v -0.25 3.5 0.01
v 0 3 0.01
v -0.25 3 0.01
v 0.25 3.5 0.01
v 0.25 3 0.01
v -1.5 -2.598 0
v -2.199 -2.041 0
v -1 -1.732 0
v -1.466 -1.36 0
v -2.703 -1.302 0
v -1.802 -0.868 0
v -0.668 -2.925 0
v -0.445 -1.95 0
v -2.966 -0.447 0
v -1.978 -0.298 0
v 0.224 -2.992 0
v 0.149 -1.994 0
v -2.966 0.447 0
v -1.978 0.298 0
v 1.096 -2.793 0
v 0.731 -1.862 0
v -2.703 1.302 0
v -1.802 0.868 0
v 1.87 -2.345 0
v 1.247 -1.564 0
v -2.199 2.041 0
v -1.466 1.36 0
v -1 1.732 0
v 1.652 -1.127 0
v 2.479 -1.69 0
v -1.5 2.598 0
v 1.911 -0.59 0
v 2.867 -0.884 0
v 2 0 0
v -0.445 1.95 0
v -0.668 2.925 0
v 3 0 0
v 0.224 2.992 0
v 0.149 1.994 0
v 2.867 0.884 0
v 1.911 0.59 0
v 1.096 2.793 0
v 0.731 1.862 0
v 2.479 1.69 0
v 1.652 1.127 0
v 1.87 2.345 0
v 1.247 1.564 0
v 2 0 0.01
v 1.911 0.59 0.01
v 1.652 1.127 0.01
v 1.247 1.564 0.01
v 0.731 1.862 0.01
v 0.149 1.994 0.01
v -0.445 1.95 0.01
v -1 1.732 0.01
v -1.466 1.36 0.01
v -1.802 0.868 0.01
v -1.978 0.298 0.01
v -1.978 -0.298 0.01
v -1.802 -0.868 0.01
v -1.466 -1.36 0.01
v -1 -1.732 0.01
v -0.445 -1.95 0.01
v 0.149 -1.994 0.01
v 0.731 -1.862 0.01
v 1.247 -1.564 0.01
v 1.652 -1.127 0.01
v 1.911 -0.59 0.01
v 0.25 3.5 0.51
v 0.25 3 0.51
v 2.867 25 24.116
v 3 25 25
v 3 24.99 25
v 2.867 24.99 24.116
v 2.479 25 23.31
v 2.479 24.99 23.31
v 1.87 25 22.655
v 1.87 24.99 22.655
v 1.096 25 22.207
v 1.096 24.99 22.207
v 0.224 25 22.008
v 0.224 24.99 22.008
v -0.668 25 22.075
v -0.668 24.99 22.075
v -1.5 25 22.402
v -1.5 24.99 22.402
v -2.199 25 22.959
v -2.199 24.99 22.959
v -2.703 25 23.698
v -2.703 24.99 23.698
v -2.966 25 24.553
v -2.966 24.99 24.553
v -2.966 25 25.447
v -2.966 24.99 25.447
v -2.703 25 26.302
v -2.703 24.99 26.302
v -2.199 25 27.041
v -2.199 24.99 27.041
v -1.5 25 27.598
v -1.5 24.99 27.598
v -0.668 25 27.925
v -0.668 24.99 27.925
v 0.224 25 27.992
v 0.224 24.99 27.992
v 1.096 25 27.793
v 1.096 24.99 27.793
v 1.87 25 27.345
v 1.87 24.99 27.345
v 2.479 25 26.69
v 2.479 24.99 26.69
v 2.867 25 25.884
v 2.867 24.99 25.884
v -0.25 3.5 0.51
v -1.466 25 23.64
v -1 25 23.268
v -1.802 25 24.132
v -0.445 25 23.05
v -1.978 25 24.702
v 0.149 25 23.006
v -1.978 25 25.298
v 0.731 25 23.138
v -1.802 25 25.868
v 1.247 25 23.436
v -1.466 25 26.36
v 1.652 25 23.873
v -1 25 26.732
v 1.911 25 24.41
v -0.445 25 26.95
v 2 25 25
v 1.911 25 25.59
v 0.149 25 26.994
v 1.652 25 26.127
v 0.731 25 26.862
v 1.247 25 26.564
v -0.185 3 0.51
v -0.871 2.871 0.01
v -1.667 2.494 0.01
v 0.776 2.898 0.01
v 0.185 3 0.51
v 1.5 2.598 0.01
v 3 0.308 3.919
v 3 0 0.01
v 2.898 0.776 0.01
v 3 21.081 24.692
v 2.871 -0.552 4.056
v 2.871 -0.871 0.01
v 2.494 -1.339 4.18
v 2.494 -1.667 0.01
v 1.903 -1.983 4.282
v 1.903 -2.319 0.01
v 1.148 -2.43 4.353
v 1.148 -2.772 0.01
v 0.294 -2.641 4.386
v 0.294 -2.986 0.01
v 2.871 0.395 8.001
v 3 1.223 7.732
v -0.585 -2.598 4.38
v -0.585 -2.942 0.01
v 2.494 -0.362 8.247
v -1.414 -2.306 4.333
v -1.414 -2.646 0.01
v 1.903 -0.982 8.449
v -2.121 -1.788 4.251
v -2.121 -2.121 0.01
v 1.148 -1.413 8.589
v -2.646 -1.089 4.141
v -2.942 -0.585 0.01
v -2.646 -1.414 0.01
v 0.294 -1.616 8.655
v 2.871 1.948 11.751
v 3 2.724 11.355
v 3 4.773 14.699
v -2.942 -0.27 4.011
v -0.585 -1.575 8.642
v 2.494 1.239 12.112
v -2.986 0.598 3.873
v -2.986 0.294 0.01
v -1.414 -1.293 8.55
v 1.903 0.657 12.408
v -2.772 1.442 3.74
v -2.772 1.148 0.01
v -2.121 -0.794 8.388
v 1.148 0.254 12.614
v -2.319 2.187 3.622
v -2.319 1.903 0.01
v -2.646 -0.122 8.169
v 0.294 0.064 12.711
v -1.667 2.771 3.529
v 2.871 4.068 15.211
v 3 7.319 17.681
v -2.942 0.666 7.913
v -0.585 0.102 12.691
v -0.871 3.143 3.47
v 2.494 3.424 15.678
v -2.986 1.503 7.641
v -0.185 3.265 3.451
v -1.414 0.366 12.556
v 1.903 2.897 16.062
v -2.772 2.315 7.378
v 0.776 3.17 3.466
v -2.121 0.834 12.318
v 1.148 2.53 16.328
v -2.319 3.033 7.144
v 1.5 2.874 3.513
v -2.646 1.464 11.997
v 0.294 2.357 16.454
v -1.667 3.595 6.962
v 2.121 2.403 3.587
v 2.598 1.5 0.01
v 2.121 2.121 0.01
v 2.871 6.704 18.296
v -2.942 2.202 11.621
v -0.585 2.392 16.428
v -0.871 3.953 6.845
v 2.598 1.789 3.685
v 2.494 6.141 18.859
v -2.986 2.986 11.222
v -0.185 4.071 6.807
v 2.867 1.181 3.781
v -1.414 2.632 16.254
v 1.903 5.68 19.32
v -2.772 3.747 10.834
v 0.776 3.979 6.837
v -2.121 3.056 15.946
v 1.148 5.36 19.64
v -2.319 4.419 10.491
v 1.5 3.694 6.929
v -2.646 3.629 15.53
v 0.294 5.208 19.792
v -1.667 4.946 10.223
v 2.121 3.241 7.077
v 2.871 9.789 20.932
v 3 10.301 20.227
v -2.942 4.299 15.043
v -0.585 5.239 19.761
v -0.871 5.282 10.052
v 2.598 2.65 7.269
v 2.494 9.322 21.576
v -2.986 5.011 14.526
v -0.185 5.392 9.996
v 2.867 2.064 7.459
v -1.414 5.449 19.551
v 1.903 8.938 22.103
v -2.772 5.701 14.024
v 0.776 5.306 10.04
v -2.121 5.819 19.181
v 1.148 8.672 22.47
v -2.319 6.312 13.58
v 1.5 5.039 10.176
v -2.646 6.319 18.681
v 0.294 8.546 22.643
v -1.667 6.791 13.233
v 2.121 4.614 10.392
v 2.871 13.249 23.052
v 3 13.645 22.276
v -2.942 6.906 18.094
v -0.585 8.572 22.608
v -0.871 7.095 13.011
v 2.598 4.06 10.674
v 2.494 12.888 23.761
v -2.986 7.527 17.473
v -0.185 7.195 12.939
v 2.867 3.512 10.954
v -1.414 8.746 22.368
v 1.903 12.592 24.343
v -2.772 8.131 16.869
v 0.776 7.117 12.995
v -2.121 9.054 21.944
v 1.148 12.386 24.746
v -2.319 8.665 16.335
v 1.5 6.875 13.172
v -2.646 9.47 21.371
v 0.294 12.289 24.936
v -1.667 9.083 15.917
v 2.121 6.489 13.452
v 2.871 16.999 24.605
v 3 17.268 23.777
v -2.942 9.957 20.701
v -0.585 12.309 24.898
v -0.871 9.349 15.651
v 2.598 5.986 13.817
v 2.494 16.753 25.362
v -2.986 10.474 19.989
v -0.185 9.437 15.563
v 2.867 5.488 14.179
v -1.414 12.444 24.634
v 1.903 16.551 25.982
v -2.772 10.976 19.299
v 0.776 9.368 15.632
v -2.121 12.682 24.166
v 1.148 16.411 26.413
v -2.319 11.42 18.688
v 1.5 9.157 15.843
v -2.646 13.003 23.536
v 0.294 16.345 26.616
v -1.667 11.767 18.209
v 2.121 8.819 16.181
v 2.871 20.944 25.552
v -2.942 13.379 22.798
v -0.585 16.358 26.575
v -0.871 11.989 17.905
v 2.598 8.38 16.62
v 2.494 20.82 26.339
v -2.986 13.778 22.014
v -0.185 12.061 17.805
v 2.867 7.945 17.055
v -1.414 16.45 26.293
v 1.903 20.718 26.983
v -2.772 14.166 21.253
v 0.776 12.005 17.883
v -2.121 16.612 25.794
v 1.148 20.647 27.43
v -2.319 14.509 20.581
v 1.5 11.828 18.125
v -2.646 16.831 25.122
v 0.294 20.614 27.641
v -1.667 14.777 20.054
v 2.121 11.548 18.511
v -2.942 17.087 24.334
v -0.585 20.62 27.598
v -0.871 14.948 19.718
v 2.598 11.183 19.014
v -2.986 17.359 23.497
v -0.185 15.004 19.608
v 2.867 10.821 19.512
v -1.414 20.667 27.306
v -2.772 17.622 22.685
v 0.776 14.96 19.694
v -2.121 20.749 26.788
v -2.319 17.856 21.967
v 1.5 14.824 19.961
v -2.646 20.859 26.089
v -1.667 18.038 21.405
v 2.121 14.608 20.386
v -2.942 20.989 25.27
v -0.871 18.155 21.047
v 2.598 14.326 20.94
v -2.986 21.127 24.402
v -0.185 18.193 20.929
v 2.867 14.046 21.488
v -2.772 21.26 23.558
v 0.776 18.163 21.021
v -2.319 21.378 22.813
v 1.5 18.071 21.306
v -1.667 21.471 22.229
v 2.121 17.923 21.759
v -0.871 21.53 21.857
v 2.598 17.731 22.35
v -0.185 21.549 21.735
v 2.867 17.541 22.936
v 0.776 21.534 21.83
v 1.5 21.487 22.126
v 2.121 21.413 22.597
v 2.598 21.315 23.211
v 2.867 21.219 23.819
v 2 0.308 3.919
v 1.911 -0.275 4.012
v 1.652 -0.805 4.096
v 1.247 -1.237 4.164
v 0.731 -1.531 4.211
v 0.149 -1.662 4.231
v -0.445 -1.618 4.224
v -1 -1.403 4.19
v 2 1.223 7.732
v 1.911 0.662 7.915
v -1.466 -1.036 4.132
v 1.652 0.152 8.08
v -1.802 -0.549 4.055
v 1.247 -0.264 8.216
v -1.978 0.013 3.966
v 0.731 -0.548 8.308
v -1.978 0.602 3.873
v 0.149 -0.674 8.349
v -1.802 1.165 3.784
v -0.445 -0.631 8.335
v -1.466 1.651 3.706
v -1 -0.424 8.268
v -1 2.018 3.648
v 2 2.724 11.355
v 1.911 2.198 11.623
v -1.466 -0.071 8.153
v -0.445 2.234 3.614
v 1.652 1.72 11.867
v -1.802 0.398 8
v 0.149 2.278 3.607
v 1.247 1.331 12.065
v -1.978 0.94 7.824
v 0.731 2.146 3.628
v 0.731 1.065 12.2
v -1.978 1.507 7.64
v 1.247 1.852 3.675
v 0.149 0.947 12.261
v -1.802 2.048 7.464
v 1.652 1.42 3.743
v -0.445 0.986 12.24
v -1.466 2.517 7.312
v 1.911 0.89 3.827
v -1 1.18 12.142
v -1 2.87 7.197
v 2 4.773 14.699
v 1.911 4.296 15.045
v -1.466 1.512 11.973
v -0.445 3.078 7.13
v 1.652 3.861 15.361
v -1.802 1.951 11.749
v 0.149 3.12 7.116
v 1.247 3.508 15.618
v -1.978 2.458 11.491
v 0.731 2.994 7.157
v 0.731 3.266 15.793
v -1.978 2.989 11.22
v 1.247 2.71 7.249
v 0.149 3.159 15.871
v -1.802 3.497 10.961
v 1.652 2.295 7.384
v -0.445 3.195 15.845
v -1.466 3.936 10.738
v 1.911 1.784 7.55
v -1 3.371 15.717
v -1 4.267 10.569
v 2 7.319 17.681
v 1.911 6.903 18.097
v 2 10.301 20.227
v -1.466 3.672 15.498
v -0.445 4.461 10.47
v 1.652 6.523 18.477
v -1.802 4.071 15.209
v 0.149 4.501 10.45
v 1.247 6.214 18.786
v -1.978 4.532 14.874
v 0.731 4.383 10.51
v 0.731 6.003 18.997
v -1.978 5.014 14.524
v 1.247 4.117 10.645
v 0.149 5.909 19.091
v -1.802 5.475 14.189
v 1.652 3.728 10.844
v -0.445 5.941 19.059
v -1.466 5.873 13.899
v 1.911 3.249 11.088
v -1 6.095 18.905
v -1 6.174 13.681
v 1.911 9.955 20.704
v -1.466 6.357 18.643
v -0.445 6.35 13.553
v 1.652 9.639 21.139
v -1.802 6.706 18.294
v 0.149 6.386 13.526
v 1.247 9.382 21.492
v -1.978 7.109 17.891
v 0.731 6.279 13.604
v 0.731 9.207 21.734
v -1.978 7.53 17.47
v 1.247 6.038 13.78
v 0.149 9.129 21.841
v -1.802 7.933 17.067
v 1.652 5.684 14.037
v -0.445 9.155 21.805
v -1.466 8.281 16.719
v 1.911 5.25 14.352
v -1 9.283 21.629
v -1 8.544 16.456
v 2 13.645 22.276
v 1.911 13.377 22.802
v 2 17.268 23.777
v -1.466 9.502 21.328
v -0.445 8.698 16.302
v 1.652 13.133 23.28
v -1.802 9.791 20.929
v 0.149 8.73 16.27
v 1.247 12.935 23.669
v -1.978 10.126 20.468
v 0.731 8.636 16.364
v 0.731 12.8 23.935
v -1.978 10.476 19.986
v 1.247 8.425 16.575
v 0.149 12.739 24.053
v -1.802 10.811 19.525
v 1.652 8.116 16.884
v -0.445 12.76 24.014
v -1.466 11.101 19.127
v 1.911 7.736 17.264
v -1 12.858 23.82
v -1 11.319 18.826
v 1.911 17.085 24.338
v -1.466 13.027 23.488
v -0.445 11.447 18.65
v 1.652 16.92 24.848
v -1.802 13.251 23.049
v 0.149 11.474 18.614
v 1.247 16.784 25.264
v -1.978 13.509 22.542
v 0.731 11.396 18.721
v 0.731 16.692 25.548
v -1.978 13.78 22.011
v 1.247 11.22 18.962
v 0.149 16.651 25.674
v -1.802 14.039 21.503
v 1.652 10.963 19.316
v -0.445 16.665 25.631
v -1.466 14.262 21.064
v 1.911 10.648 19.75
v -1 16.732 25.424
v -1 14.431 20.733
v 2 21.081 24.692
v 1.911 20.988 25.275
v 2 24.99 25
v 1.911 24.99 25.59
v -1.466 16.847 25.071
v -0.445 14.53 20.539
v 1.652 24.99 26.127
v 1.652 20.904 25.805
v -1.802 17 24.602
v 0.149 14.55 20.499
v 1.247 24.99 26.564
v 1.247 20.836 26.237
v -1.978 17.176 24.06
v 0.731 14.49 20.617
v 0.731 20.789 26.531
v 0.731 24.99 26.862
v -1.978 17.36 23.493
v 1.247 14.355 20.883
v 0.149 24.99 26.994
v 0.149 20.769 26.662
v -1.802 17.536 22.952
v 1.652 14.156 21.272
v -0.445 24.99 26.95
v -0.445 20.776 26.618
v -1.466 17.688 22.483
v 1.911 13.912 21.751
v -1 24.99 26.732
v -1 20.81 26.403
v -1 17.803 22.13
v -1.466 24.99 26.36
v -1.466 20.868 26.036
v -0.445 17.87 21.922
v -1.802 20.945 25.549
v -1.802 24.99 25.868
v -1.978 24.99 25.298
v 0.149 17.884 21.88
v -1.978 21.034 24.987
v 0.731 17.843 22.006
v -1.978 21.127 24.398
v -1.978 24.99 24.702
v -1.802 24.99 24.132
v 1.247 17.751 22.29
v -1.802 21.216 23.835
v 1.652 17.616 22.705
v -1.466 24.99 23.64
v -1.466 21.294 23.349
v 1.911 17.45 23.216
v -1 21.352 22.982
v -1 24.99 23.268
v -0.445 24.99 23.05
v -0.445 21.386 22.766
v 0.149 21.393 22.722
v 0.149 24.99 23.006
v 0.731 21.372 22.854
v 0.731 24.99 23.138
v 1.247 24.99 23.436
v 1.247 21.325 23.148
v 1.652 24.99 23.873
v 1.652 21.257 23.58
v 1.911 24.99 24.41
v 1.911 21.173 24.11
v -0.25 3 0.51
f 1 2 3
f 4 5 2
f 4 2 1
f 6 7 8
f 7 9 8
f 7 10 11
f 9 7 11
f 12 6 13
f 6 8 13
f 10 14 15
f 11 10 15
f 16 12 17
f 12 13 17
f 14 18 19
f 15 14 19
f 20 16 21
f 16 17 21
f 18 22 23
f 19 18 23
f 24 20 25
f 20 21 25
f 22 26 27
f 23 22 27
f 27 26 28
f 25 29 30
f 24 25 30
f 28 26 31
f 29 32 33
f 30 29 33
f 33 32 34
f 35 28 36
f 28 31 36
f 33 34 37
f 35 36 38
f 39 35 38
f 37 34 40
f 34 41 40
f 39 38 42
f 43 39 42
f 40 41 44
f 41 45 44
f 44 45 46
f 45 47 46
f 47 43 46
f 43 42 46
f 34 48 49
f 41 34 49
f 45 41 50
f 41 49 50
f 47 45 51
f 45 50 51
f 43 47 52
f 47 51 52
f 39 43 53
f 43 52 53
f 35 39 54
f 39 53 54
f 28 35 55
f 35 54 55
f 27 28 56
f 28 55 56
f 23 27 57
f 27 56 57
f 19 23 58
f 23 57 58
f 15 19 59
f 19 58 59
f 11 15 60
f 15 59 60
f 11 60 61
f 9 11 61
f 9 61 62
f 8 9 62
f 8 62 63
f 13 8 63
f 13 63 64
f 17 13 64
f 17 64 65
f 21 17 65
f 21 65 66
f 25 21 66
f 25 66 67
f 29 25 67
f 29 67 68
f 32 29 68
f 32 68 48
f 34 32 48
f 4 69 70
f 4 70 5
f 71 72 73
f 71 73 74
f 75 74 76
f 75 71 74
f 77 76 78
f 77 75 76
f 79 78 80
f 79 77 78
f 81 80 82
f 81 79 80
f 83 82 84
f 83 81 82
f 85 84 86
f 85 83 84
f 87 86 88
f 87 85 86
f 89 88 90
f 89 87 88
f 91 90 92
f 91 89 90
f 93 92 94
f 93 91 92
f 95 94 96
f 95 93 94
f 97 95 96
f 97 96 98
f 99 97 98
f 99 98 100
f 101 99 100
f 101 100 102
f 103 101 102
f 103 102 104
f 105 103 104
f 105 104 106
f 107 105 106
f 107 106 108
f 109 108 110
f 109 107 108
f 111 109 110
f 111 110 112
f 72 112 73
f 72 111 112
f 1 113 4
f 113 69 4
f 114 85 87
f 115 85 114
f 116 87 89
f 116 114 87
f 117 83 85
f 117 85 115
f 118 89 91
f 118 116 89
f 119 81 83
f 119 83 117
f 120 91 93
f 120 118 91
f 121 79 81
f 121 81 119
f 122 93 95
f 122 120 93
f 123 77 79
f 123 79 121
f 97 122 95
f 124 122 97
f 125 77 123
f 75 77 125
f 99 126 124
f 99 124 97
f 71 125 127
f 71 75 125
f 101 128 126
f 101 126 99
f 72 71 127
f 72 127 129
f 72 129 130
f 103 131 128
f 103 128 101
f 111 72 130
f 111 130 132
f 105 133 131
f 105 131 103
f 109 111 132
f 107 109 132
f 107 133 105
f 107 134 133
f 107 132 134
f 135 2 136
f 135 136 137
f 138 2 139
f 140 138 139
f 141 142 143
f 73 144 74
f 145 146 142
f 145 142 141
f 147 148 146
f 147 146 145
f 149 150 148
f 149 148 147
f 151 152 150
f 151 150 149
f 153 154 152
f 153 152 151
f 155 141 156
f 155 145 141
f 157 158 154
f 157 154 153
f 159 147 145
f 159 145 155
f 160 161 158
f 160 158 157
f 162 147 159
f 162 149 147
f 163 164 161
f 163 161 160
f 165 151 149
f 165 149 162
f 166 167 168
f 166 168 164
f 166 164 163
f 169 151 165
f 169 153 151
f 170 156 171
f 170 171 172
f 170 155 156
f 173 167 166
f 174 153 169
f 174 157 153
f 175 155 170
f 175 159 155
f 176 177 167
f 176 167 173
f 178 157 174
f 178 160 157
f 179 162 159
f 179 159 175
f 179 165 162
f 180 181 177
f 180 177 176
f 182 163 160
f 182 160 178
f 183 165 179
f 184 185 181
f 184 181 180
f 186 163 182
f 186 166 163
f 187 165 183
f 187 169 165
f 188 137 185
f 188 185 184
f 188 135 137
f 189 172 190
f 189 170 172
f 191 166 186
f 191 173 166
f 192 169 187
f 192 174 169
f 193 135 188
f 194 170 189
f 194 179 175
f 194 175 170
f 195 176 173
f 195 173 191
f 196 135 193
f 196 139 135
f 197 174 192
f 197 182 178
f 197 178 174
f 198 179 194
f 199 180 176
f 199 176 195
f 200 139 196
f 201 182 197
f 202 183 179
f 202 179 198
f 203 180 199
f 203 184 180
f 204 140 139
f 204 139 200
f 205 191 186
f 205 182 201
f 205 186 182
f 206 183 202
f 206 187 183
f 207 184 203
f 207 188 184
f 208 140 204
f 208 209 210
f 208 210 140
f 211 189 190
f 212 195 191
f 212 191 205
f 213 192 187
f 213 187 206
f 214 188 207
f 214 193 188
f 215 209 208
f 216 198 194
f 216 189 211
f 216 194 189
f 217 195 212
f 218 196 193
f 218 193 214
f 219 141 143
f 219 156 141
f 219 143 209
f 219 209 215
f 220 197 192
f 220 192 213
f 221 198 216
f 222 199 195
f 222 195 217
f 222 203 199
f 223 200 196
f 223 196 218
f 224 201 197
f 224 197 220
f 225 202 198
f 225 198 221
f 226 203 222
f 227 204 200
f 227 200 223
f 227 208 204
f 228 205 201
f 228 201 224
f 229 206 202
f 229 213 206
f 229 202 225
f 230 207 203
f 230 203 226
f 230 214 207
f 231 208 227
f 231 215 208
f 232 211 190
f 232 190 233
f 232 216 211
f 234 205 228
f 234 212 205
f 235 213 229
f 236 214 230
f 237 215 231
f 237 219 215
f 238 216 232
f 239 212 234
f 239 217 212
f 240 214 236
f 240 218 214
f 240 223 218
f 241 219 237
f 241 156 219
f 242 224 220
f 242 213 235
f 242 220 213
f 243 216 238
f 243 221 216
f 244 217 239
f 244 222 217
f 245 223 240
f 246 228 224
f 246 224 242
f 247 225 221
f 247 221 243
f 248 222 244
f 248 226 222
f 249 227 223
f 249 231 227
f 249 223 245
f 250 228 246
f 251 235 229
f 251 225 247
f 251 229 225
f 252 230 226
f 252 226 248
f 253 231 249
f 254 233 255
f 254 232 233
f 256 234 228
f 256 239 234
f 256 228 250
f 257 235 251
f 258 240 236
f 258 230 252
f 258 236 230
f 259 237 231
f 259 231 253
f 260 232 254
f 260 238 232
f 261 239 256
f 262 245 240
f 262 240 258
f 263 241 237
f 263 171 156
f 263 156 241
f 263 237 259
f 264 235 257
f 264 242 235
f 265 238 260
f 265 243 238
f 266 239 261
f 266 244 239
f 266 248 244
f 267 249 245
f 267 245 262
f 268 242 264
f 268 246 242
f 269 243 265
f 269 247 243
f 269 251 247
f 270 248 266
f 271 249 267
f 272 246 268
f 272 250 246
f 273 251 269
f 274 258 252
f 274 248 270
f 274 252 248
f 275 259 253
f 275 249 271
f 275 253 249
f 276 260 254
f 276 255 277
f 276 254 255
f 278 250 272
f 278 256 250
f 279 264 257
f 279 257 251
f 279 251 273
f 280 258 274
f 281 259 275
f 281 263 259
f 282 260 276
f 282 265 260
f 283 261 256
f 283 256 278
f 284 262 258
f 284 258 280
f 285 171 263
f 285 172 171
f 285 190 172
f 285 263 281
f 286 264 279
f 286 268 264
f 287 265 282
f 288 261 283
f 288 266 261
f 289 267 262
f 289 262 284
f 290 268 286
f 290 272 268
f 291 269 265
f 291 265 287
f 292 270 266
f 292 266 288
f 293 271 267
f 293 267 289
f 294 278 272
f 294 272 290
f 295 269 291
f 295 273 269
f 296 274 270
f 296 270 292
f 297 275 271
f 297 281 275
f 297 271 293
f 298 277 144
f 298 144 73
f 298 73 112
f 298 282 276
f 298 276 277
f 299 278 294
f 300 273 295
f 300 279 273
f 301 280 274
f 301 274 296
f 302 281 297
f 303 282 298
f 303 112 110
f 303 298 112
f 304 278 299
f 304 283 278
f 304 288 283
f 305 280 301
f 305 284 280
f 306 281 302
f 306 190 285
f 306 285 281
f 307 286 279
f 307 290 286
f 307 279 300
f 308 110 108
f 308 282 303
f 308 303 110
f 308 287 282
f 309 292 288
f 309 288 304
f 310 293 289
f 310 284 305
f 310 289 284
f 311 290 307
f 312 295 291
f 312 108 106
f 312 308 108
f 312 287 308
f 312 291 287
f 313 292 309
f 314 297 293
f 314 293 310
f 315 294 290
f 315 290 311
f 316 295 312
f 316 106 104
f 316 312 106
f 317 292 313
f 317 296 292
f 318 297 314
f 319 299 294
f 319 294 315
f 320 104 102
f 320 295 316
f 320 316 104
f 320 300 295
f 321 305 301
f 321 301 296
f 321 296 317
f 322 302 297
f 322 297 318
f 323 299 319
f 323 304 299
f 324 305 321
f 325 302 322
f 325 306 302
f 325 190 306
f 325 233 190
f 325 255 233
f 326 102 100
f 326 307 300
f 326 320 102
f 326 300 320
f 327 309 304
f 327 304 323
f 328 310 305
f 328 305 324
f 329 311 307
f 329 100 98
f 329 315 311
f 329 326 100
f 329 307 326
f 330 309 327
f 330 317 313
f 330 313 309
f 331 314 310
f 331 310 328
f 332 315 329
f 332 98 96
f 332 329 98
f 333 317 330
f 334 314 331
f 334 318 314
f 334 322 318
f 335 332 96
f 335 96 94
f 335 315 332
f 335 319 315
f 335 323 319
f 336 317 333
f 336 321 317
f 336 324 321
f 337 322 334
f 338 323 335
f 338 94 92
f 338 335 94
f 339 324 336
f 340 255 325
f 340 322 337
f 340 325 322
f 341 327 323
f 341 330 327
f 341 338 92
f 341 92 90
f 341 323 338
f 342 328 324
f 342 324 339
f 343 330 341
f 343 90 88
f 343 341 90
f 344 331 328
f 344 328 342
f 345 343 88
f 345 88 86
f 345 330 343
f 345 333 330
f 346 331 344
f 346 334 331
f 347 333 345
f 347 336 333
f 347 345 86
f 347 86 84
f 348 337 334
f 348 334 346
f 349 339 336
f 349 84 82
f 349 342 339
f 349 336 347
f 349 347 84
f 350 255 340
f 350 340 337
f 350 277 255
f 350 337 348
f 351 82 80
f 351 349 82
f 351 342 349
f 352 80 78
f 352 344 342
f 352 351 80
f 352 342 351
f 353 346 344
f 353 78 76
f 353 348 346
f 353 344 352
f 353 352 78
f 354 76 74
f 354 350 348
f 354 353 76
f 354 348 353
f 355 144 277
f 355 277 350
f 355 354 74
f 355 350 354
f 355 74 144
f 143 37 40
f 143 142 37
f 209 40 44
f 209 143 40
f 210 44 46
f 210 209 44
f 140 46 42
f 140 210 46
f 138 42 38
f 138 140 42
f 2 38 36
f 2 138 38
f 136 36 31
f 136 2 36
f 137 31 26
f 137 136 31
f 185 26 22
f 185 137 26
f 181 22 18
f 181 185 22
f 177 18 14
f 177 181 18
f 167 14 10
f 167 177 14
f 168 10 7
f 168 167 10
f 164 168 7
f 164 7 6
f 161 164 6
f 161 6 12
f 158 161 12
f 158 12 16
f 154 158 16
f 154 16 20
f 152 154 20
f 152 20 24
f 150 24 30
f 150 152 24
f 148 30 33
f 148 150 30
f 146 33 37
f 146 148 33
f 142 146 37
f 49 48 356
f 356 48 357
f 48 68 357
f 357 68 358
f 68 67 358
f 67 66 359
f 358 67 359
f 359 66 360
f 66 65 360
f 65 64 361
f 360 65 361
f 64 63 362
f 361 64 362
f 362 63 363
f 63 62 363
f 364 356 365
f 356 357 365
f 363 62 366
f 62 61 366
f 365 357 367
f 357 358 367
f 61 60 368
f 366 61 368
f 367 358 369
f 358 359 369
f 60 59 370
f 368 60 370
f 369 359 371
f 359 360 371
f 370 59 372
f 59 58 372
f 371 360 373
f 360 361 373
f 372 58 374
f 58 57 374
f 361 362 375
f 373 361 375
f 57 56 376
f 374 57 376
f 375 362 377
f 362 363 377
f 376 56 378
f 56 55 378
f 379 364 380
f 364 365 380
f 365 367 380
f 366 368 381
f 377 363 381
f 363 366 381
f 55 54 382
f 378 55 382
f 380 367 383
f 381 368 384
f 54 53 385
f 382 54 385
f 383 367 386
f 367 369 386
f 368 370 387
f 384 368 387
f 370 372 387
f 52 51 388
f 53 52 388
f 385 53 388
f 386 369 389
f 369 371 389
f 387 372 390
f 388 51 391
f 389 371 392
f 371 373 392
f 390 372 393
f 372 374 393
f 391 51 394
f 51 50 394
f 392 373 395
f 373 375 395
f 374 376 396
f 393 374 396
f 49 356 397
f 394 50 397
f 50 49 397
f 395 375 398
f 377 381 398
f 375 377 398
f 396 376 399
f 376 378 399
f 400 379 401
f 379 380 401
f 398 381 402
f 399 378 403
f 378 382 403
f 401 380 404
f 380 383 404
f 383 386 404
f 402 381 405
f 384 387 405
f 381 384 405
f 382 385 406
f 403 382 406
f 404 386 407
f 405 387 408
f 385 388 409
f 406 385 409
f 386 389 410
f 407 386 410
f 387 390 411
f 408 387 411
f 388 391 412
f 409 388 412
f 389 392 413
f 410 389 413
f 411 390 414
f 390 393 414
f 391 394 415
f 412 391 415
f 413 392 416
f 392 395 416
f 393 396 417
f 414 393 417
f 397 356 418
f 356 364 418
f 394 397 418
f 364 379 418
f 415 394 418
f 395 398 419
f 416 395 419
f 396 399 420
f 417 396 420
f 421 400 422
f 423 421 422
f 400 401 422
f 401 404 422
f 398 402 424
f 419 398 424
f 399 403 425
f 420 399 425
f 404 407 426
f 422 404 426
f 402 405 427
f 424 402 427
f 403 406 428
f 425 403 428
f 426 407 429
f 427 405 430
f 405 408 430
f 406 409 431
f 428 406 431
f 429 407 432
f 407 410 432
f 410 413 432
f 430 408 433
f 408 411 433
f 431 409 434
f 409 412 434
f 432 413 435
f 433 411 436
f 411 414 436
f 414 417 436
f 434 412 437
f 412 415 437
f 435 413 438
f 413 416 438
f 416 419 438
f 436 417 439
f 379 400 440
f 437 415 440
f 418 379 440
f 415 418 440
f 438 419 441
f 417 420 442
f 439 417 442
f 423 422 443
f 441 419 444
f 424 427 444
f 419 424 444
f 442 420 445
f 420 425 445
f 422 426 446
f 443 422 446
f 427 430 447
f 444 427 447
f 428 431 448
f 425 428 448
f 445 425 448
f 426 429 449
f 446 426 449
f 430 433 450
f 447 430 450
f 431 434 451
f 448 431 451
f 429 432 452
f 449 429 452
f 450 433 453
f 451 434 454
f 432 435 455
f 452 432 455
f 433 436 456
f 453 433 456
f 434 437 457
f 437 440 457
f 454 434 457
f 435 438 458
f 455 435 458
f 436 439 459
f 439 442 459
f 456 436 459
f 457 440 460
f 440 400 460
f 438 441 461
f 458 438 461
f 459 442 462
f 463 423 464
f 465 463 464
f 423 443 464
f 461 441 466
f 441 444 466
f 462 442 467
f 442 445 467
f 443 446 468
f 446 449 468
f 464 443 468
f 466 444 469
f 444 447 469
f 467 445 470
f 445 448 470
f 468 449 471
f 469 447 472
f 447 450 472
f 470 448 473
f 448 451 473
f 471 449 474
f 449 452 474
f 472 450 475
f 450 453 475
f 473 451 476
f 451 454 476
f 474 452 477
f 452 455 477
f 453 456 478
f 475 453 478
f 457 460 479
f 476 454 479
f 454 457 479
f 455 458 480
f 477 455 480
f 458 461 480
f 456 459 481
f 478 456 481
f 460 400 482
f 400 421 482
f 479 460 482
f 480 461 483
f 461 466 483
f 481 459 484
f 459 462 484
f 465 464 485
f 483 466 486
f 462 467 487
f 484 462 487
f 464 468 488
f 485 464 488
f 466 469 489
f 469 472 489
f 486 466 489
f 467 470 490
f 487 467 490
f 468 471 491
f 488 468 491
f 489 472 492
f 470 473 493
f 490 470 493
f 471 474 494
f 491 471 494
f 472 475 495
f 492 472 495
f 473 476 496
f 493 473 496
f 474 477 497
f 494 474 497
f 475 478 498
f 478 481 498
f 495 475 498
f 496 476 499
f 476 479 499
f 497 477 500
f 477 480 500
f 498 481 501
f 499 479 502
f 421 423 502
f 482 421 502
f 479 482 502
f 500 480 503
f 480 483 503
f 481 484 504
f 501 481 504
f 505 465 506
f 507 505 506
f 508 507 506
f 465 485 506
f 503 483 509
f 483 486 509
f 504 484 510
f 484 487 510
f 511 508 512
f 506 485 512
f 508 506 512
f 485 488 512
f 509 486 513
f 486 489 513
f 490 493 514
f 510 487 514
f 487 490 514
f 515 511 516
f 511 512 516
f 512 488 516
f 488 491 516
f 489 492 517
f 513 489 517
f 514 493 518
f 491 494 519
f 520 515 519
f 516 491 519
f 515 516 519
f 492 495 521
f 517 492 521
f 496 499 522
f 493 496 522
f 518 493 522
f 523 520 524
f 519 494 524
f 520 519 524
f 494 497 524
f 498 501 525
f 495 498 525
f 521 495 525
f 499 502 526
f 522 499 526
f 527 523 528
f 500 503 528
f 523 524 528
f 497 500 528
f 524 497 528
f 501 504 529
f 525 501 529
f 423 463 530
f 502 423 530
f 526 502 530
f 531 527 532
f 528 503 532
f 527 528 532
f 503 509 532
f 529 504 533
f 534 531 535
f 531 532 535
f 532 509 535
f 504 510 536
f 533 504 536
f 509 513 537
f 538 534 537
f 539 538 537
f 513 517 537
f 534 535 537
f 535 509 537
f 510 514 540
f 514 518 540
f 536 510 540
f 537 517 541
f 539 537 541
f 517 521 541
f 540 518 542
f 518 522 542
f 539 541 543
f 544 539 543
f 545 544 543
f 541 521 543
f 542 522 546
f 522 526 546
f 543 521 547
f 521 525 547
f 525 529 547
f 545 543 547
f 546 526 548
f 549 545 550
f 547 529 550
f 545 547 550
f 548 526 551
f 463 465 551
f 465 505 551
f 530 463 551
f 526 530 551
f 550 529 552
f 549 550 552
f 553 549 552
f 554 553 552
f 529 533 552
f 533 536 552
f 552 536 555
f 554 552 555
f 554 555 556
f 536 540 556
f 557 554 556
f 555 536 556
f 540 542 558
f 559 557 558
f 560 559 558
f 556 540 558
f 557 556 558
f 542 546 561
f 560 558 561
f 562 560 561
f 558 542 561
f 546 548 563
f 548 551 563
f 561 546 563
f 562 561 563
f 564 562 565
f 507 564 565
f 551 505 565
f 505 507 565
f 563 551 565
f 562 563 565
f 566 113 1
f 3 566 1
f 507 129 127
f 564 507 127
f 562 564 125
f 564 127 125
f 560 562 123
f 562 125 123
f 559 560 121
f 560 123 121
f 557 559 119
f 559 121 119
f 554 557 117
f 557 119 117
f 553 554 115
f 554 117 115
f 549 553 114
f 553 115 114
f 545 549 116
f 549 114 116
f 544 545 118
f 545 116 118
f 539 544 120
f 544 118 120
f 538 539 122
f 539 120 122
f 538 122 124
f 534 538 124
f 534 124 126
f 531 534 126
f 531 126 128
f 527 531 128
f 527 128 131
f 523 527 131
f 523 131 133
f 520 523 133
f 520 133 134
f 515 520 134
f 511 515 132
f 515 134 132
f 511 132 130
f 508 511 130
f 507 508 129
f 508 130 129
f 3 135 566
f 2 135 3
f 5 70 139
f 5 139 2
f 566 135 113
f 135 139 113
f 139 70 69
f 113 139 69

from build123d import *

# Parameters (mm, degrees)
SKETCH1_R           = 3
SKETCH1_R_2         = 2
SKETCH3_W           = 0.5
SKETCH3_H           = 0.5
BOSS_EXTRUDE1_DEPTH = 0.25


with BuildPart() as part:
    # Sweep1: sweep along a path in Sketch2
    with BuildLine(Plane(origin=(0, 0, 0), x_dir=(0, 0, -1), z_dir=(1, 0, 0))) as sweep1_path:
        Line((0, 0), (-0.01, 0))
        ThreePointArc((-0.01, 0), (-17.680598462, 7.319401538), (-25, 24.99))
        Line((-25, 24.99), (-25, 25))
    # Sketch1 → Sweep1 (sweep)
    with BuildSketch(Plane.XY):
        Circle(SKETCH1_R)
        Circle(SKETCH1_R_2, mode=Mode.SUBTRACT)
    sweep(path=sweep1_path.line)

    # Sketch3 → Boss-Extrude1 (add, symmetric)
    with BuildSketch(Plane(origin=(0, 0, 0), x_dir=(0, 0, -1), z_dir=(1, 0, 0))):
        with Locations((-0.26, 3.25)):
            Rectangle(SKETCH3_W, SKETCH3_H)
    extrude(amount=BOSS_EXTRUDE1_DEPTH, both=True)


solid = part.part
